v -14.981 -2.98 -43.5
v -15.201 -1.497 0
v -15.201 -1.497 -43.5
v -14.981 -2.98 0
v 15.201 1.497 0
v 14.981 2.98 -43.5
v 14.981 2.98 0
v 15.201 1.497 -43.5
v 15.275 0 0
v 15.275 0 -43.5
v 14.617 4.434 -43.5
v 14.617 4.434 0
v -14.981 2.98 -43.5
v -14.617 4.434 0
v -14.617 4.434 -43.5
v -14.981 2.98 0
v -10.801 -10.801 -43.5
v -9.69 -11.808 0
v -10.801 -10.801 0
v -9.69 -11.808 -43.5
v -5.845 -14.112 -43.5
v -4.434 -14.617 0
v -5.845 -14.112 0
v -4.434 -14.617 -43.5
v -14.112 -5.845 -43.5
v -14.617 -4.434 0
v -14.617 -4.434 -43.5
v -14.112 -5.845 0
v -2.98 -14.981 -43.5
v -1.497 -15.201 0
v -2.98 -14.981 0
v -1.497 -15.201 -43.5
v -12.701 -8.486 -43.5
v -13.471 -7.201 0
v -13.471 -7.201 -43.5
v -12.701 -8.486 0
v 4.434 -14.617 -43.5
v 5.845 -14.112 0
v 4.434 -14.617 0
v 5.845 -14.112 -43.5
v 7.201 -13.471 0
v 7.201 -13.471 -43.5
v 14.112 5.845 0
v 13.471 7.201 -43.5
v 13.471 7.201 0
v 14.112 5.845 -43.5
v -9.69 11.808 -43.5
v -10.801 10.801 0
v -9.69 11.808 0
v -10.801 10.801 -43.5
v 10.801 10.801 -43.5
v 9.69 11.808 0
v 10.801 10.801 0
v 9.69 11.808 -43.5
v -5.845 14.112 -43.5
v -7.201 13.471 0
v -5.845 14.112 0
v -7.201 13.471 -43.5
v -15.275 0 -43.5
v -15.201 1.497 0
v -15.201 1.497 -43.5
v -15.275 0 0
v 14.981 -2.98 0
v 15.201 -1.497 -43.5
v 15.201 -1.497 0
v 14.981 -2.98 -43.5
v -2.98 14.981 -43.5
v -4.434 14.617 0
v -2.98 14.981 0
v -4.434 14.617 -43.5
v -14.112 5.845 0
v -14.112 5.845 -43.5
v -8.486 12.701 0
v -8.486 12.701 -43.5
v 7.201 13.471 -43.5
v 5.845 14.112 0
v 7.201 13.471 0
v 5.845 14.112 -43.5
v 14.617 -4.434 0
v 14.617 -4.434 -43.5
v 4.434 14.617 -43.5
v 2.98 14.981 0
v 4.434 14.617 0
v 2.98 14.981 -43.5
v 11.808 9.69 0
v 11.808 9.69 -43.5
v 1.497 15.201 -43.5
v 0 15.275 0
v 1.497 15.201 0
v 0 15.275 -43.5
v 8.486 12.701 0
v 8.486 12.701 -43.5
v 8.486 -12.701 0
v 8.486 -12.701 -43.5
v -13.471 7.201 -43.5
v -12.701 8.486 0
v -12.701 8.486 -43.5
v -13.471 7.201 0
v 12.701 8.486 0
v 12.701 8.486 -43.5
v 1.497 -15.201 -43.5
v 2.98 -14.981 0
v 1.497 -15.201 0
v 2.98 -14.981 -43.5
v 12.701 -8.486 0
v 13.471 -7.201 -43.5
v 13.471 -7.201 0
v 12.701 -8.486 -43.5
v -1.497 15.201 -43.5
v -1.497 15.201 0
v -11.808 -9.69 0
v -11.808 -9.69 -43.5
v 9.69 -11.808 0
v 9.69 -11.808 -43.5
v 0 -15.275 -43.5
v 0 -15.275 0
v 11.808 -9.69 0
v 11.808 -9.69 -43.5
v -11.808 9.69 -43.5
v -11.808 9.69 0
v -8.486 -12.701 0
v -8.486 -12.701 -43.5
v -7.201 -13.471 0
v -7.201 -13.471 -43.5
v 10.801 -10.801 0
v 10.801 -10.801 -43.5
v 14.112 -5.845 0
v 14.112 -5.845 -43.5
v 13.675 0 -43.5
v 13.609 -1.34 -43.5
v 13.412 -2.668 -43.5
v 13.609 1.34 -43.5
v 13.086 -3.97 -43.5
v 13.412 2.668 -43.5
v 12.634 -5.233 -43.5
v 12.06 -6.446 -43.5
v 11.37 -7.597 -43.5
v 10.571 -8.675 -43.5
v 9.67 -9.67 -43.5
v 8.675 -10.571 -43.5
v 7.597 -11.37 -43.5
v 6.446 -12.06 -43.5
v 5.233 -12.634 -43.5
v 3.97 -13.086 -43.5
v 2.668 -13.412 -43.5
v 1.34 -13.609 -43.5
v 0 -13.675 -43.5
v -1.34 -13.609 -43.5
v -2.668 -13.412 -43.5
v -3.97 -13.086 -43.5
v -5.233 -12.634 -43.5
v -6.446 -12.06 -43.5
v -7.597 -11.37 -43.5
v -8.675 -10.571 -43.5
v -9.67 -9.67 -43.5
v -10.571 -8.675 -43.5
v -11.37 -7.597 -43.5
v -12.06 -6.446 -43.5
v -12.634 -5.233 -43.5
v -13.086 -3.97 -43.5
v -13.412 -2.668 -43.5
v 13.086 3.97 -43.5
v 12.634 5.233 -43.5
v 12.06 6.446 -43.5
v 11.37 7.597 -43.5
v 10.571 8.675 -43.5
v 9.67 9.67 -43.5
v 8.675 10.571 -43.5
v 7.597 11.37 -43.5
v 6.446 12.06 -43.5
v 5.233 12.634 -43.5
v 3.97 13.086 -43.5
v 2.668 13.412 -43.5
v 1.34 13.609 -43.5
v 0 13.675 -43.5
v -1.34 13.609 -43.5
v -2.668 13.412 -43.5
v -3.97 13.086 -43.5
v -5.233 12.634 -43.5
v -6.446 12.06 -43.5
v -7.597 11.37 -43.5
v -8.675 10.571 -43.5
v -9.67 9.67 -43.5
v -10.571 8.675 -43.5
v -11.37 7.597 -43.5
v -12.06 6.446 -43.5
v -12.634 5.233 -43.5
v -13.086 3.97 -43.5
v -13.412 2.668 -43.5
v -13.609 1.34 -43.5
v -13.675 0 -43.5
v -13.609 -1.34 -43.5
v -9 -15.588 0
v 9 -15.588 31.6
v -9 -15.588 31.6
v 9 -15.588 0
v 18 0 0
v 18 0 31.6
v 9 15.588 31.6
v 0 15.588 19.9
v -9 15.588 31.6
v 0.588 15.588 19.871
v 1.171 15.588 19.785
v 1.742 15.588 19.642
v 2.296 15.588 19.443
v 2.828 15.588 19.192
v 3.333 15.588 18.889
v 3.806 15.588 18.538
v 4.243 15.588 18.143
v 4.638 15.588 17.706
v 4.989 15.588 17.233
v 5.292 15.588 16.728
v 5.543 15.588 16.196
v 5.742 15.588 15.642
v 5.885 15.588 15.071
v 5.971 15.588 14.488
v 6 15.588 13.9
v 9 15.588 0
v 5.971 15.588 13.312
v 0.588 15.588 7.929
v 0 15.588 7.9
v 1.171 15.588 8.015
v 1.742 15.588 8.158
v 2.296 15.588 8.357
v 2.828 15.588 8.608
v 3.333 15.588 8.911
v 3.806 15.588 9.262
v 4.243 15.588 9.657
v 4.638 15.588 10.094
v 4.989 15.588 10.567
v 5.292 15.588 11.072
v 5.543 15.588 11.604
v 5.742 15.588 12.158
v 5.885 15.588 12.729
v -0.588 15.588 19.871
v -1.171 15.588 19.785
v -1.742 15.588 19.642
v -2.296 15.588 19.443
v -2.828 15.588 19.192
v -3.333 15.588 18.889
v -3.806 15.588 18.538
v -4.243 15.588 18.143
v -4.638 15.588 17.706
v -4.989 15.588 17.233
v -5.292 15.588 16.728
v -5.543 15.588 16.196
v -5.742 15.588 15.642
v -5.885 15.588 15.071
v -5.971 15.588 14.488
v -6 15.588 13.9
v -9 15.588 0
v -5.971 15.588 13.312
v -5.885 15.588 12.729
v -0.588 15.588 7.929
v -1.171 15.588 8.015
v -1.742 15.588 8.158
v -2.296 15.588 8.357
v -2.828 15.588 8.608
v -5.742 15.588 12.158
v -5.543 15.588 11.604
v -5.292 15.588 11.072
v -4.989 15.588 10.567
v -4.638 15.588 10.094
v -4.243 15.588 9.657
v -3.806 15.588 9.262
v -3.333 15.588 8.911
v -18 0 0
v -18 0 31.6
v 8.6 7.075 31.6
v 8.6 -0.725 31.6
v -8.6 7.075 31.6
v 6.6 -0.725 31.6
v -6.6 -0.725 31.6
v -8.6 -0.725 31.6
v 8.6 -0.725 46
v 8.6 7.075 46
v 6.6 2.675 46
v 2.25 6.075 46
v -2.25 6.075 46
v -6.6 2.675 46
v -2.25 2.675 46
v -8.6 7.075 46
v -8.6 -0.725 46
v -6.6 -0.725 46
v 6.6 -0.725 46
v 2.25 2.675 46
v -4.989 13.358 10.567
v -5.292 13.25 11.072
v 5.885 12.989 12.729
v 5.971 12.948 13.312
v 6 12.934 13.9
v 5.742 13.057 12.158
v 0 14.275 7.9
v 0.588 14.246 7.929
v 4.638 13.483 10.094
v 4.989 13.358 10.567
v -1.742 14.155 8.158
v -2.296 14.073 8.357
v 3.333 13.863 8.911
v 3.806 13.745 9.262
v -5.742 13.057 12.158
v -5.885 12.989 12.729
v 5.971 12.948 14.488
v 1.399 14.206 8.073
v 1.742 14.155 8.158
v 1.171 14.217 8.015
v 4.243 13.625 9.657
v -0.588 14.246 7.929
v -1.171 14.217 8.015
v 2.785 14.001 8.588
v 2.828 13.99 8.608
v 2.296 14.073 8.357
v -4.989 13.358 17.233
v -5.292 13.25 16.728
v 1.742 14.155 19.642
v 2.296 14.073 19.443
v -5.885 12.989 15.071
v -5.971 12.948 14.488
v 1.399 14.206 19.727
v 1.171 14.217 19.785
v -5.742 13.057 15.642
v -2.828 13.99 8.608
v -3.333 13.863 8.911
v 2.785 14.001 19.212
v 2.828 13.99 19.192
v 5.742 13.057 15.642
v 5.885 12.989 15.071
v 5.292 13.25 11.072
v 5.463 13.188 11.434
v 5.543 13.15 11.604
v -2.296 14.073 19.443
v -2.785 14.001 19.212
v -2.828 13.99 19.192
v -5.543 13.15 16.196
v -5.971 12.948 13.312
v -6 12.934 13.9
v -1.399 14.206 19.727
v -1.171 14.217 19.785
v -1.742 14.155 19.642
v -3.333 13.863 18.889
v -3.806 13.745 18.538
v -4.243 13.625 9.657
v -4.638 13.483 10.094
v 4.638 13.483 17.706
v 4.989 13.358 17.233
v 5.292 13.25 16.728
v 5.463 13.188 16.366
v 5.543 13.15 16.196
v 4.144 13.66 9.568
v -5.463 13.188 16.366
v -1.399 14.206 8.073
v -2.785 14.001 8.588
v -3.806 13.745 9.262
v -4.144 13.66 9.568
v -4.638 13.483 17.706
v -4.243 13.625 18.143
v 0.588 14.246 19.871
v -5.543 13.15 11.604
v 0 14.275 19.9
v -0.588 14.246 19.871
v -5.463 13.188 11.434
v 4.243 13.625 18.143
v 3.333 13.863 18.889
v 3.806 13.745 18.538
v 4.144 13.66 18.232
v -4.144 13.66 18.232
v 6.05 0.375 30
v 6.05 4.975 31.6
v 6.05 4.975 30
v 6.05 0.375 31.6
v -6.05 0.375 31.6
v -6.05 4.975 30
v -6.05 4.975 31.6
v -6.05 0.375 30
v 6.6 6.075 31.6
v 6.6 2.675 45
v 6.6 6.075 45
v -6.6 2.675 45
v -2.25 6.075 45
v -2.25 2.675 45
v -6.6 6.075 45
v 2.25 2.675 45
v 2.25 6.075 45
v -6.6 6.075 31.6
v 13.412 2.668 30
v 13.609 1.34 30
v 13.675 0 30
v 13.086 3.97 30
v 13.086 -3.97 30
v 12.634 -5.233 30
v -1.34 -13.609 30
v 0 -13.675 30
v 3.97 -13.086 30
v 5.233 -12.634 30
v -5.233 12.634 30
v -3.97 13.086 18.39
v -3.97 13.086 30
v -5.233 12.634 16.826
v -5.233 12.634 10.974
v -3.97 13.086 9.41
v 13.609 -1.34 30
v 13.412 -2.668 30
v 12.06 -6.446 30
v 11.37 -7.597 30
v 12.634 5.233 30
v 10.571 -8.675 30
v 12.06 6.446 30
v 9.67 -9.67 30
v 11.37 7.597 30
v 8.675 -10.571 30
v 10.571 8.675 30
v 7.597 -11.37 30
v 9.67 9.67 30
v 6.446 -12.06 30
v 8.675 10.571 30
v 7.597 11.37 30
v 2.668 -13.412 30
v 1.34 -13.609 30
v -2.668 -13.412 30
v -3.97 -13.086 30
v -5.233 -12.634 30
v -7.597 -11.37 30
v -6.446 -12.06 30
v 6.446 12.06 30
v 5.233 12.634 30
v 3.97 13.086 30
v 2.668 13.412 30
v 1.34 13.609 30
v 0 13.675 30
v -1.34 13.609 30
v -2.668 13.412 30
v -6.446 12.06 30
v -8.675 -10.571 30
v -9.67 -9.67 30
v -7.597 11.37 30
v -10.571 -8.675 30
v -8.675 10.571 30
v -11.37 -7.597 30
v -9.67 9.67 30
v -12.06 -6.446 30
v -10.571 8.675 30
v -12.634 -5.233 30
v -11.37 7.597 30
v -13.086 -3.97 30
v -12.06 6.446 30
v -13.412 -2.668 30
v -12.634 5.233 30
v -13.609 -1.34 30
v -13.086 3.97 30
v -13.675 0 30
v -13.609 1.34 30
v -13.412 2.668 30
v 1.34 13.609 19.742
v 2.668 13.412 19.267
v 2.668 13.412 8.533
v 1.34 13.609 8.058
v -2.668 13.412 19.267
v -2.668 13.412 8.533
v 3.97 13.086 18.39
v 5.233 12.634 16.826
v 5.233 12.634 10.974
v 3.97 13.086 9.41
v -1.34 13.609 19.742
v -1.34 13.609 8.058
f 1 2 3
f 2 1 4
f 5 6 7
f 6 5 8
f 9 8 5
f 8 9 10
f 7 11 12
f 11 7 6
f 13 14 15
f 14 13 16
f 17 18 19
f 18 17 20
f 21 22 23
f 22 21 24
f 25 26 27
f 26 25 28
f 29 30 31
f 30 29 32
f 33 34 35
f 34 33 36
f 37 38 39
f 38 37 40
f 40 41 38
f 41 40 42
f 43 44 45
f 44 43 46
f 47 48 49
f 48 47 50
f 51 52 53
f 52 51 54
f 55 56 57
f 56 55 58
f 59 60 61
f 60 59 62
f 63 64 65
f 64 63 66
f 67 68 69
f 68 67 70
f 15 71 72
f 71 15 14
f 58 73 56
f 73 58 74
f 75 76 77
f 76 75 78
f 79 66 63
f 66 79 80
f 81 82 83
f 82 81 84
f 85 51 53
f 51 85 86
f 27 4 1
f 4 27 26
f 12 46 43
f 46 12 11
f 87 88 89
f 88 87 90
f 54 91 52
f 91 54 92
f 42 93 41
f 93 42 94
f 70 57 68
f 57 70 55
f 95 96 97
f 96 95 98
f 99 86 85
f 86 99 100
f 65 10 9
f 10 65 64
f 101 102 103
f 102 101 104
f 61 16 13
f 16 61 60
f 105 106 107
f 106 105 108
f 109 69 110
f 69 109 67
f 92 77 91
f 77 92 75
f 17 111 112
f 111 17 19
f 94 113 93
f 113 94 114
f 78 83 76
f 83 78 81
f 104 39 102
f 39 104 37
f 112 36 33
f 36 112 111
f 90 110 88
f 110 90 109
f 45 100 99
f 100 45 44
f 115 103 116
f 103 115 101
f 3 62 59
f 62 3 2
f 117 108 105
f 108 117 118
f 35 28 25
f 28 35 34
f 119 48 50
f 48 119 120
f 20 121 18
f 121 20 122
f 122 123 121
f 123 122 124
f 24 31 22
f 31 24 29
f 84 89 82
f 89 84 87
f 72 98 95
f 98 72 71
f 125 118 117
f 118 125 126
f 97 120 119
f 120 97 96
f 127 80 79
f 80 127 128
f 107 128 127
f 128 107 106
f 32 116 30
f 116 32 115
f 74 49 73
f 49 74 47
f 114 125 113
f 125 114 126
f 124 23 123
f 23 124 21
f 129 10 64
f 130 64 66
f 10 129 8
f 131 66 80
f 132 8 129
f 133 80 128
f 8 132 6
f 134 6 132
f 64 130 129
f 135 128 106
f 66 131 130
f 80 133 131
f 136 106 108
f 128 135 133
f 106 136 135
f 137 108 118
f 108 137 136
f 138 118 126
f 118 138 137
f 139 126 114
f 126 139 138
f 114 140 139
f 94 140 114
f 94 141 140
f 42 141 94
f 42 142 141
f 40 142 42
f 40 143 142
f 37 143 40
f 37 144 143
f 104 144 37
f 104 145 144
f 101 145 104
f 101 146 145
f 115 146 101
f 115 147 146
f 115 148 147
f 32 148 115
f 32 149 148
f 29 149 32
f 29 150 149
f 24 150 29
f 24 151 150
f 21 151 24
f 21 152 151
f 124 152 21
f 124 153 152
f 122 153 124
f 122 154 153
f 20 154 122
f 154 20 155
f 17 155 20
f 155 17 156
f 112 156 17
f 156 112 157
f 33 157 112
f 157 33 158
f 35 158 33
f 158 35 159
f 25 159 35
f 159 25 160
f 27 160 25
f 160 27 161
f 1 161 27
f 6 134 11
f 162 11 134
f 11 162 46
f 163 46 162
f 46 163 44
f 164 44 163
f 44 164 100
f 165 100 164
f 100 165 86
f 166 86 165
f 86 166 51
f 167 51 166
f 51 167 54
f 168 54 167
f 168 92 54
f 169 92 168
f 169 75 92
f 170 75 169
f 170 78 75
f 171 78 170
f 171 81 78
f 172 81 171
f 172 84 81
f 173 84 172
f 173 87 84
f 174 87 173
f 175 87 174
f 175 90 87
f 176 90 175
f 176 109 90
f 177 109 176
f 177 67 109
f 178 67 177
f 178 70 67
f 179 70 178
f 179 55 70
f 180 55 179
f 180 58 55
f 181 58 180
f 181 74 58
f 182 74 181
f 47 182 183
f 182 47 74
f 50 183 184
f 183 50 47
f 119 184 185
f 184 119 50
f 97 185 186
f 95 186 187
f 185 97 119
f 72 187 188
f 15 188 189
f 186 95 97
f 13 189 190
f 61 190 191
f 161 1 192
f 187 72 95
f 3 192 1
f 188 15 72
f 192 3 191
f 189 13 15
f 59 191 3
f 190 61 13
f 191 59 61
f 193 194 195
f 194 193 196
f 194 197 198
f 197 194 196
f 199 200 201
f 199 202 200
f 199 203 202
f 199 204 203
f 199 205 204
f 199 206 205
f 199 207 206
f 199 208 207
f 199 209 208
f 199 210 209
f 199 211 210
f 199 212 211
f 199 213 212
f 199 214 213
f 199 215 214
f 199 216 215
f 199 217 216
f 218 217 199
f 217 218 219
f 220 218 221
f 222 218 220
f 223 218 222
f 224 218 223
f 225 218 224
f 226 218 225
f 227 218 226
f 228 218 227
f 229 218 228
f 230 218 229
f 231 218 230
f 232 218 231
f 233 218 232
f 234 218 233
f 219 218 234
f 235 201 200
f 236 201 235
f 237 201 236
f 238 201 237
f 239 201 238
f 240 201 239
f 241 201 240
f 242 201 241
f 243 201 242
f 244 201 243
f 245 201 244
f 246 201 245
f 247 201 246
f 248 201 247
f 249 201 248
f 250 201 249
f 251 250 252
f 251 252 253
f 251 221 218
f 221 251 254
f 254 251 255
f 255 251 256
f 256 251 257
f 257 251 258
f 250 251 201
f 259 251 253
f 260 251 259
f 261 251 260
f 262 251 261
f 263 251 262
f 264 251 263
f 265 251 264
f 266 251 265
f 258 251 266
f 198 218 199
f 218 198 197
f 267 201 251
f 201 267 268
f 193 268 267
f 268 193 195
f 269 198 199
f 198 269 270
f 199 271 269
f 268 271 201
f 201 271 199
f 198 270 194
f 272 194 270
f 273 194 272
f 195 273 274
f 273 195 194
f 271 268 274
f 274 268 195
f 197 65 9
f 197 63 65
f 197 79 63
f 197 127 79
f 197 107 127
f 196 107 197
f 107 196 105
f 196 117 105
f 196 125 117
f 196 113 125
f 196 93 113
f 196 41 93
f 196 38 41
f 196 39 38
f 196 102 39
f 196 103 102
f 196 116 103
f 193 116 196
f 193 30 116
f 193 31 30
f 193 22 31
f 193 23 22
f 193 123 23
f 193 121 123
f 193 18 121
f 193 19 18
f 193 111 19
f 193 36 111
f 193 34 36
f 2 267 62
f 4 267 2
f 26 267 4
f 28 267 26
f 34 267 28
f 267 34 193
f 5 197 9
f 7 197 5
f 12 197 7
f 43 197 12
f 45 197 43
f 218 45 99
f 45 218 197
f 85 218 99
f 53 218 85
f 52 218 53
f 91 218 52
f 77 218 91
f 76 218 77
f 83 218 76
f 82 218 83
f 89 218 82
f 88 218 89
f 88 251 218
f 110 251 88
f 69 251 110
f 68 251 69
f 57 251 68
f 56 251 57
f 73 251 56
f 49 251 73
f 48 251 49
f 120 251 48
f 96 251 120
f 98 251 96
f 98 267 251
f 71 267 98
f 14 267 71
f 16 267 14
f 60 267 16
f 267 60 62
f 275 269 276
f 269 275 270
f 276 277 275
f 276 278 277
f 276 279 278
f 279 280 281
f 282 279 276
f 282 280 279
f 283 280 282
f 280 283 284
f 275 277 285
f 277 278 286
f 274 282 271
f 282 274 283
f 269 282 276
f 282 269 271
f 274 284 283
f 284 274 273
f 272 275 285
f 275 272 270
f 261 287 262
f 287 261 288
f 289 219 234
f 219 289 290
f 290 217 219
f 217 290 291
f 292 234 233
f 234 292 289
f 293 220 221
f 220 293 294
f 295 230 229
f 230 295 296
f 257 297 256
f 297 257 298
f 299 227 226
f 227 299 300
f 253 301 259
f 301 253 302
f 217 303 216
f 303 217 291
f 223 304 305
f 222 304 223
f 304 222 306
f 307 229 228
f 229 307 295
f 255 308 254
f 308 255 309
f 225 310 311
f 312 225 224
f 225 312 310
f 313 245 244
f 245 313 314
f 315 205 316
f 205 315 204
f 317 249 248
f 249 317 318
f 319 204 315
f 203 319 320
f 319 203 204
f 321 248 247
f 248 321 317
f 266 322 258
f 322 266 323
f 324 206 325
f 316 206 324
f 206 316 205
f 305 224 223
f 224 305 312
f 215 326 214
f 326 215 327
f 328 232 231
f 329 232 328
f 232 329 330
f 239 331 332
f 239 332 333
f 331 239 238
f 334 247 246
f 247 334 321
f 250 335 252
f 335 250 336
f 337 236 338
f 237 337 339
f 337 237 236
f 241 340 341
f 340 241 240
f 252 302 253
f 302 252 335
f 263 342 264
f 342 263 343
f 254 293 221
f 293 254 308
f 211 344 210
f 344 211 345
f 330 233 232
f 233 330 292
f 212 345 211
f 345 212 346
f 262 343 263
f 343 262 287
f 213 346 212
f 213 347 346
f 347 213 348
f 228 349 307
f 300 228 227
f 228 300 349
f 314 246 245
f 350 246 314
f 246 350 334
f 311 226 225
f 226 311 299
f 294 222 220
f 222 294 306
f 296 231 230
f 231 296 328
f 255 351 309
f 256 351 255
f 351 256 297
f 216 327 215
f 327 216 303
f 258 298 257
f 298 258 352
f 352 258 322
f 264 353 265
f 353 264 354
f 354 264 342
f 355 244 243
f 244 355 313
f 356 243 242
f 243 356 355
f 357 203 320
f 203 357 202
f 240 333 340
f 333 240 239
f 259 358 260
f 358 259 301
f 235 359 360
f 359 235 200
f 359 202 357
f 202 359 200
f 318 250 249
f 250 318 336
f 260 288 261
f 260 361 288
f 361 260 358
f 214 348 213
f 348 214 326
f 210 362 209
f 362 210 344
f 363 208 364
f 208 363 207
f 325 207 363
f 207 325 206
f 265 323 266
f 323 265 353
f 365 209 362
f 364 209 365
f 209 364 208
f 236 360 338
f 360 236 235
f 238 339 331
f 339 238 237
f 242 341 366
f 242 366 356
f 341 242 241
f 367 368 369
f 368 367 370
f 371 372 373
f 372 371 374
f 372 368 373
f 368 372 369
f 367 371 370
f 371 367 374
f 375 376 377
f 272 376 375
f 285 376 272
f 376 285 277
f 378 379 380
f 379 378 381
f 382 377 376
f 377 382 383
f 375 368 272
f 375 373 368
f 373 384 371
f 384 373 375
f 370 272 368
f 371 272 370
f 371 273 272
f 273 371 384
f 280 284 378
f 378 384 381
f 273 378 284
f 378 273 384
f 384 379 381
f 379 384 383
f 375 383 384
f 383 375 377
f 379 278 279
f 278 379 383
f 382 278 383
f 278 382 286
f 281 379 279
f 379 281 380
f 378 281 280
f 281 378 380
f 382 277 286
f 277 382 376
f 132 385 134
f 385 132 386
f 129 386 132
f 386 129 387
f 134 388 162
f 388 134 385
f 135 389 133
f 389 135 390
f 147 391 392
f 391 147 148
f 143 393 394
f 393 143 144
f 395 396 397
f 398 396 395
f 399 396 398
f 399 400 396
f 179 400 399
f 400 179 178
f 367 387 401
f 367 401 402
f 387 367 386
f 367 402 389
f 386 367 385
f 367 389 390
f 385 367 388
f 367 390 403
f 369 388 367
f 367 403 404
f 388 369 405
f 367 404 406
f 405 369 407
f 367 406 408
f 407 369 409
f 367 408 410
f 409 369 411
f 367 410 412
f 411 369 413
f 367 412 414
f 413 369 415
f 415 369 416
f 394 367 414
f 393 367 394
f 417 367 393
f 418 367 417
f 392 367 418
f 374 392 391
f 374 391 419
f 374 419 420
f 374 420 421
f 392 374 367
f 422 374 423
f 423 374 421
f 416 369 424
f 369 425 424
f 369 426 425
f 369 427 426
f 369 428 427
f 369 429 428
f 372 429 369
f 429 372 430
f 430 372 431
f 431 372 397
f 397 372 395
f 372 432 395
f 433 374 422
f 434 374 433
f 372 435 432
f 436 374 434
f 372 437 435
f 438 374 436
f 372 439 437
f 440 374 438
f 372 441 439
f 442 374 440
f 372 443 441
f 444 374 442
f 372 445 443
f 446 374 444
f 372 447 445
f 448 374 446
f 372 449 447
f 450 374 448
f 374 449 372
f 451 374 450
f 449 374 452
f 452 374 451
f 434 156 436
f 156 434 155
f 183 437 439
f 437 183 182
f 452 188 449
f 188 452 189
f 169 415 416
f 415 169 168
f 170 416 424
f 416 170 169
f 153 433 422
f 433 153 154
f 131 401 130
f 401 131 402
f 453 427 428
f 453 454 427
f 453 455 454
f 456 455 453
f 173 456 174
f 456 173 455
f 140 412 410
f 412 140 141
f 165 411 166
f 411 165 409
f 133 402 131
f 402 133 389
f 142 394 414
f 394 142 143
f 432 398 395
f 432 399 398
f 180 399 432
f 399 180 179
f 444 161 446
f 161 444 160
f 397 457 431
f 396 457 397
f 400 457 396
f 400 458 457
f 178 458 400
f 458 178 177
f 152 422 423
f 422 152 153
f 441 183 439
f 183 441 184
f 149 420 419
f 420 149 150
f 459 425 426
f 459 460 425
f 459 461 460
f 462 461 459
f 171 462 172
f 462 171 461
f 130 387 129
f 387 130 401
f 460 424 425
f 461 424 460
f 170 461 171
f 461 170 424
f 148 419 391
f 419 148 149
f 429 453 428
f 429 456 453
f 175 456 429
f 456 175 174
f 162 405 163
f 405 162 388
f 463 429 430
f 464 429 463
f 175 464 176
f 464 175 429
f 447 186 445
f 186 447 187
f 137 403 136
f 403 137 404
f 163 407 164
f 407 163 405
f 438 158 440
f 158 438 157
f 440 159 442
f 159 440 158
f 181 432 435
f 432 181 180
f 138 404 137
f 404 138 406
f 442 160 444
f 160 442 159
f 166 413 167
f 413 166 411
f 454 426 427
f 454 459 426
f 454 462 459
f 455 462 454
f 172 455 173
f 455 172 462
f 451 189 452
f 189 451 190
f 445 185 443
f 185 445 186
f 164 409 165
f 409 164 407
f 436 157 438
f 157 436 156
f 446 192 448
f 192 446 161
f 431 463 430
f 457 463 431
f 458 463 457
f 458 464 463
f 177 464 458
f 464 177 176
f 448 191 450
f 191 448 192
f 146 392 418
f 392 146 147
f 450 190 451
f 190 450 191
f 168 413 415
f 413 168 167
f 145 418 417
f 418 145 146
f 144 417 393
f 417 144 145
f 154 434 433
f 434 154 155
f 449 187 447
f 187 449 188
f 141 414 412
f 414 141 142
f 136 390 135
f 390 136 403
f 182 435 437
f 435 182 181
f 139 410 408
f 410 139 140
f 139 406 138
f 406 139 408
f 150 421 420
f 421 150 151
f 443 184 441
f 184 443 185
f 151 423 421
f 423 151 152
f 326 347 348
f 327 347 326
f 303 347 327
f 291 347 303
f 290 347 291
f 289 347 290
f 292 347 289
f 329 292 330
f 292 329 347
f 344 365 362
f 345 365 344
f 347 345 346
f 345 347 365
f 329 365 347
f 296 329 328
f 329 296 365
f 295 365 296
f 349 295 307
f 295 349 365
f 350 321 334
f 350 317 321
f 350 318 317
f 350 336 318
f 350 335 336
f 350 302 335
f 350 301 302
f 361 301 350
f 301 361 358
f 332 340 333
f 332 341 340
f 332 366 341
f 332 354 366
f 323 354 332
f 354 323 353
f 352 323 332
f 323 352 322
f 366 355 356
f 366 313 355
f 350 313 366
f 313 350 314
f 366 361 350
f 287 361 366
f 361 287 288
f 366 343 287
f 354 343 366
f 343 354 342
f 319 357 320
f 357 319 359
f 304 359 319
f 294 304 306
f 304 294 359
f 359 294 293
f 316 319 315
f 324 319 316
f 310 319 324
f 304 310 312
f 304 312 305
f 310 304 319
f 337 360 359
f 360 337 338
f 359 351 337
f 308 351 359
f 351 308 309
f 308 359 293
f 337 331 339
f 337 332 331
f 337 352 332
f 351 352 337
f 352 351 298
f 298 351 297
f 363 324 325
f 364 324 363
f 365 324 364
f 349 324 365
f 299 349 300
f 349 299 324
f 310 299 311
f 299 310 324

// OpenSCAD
$fn=6;

r1 = 5.98;
r2 = 9;
r2_p = r2 * sqrt(3) / 2;

big_r1 = 22.5/2;
big_r2 = 14;
big_r2_p = big_r2 * sqrt(3) / 2;

l1 = 30;
l2 = 45;
l3 = 50;

a1 = 35.264389682754654;
a2 = -60;
a3 = -45;


battery_r = 27.35/2;
battery_power_z_offset = 16.1;
battery_power_r = 12/2;

power_connection_h = 30;
power_connection_r = 18;
power_top_thin = 1.6;
power_top_total = 1.6;

battery_sleeve_h = 73.5;
battery_sleeve_r = battery_r + 1.6;

usb_h = 15;
usb_w = 12.1;
usb_thick = 4.6;
usb_w2 = 13.2;
usb_thick2 = 6.8;
usb_y_offset = battery_r - 11;
usb_wire_w = 4.5;


power_female_r = power_connection_r + 1.4;

box_w = power_connection_r * 2 + 1;
box_thick = 18;
box_h = 90;
box_wall = 2;

power();
//controller();

module power() {
difference() {
    union() {
        translate([0,0,power_connection_h - battery_sleeve_h])
        cylinder(h=battery_sleeve_h, r=battery_sleeve_r, $fn=64);
        
        cylinder(h=power_connection_h + power_top_total, r=power_connection_r);
    translate([0, usb_y_offset+.5, power_connection_h + usb_h/2 + 0.5])
    cube([usb_w2+4, usb_thick2+1, usb_h+1], center=true);
    }
    
    // Power indicator
    translate([0,0,power_connection_h - battery_power_z_offset])
    rotate([-90,0,0])
    cylinder(h=100, r=battery_power_r, $fn=64);
    
    translate([0, usb_y_offset, power_connection_h])
    cube([usb_w, usb_thick, usb_h], center=true);
    translate([0, usb_y_offset, power_connection_h + (power_top_thin + usb_h)/2])
    cube([usb_w2, usb_thick2, usb_h - power_top_thin], center=true);
    translate([0, usb_y_offset, power_connection_h + usb_h])
    cube([usb_wire_w, usb_thick2, 5], center=true);
    translate([0, usb_y_offset - usb_thick2/2, power_connection_h + usb_h])
    cube([usb_w2, usb_thick2, 5], center=true);
    
    translate([0,0,power_connection_h - battery_sleeve_h-1])
    cylinder(h=battery_sleeve_h+1, r=battery_r, $fn=64);
}

difference() {
    translate([0,0,0])
    cylinder(h=power_connection_h, r=battery_r+0.6, $fn=64);
    
    translate([0,0,-1])
    cylinder(h=power_connection_h+1, r=battery_r, $fn=64);
}

}

module controller() {
difference() {
    union() {
        cylinder(h=power_connection_h + power_top_total + 2, r=power_female_r);
        translate([0,0,power_connection_h + power_top_total + 2])
        cylinder(h=30, r1=power_female_r, r2=1);
        
        // Actual box
        translate([0, 0, power_connection_h + power_top_total +box_h/2])
        rotate([90,0,0])
        linear_extrude(box_thick+2*box_wall, center=true)
        polygon([
            [0, -box_h/2 - 20],
            [-box_w/2 - box_wall, -box_h/2 - box_wall],
            [-box_w/2 - box_wall, box_h/2 + box_wall],
            [0, box_h/2 + 20],
            [box_w/2 + box_wall, box_h/2 + box_wall],
            [box_w/2 + box_wall, -box_h/2 - box_wall],
        ]);
        //cube([box_w+2*box_wall, box_thick+2*box_wall, box_h+2*box_wall], center=true);
        
        translate([0,0,power_connection_h + power_top_total + box_h-36])
        cylinder(h = 30, r1=1, r2=big_r2);
        translate([0,0,power_connection_h + power_top_total + box_h-6])
        cylinder(h = 56, r=big_r2);
        
        
        translate([0,0, power_connection_h - 16])
        rotate([90,0,0])
        linear_extrude(5, center=true)
        union() {
        polygon([
            [0, -15],
            [30, 10],
            [30, 48],
            [24, 48],
            [24, 76],
            [30, 76],
            [30, 115],
            [0, 140],
        ]);
        rotate([0,180,0])
        polygon([
            [0, -15],
            [30, 10],
            [30, 48],
            [24, 48],
            [24, 76],
            [30, 76],
            [30, 115],
            [0, 140],
        ]);
        }
    }// end union
    
    cylinder(h=power_connection_h + power_top_total, r=power_connection_r + 0.15);
    
    translate([0, 0, power_connection_h + power_top_total + box_h/2])
    cube([power_connection_r*2, box_thick, box_h], center=true);
    
    // Power indicator
    translate([0,0,power_connection_h - battery_power_z_offset])
    rotate([-90,0,0])
    cylinder(h=100, r=battery_power_r, $fn=64);
    
    translate([0,0,power_connection_h + power_top_total + box_h])
    cylinder(h = 51, r=big_r1, $fn=64);
    
    translate([0, 0, -50])
    cube([100, 100, 100], center=true);
    
    // Deboss
    for (i = [0:1]) {
        rotate([0,0,180*i])
        translate([0, -box_thick/2 - box_wall + 0.6, 70])
        rotate([90,0,0])
        linear_extrude(1)
        scale(0.4)
        import("./ravenstear.svg", center=true);
    }
    
    // Removal for "test"
    //translate([0, 0, 220])
    //cube([100,100,400], center=true);
}
}
    
module tossme() {
difference() {
union() {
for (i = [0:2]) {
    rotate([0,0, 120*i])
    union() {
        rotate([a1, 0, 0])
        translate([0,0,-81.63010851410841])
        translate([0,0,-l1])
        difference() {
            cylinder(h=l1, r=r2);
            
//            cylinder(h=l1 + 1, r=r1, $fn=64);
              
            translate([0, r2_p, 0])
            rotate([a2/2, 0, 0]) 
            translate([0, 0, -50])
            cube([100, 100, 100], center=true);
        }
        
        rotate([a1, 0, 0])
        translate([0,0,-81.63010851410841])
        translate([0, r2_p, -l1])
        rotate([a2/2, 0, 0]) 
        difference() {
            rotate([a2/2, 0, 0])    
            translate([0, -r2_p, -l2])
            difference() {
                cylinder(h=l2, r=r2);
            
 //               cylinder(h=l2, r=r1, $fn=64);
                
                translate([0, r2_p, 0])
                rotate([a3/2, 0, 0]) 
                translate([0, 0, -50])
                cube([100, 100, 100], center=true);
            }
            
            translate([-50, -50, 0])
            cube([100, 100, 100]);
        }
        
        rotate([a1, 0, 0])
        translate([0,0,-81.63010851410841])
        translate([0, r2_p, -l1])
        rotate([a2, 0, 0])
        translate([0, 0, -l2])
        rotate([a3/2, 0, 0]) 
        difference() {
            rotate([a3/2, 0, 0])    
            translate([0, -r2_p, -l3])
            cylinder(h=l3, r=r2);
            
  //          rotate([a3/2, 0, 0])    
  //          translate([0, -r2_p, -l3-1])
  //          cylinder(h=l3+1, r=r1, $fn=64);
            
            translate([-50, -50, 0])
            cube([100, 100, 100]);
        }
        
        translate([0,0,-150])
        rotate([-30,0,0])
        translate([0,7,10])
        cube([r2, 16, 35], center=true);
        
        translate([0,0, -195])
        rotate([90,0,30])
        linear_extrude(3, center=true)
        polygon([
            [big_r2_p, 0],
            [big_r2_p + 7, 0],
            [big_r2_p + 7, 12],
            [big_r2_p + 10, 12],
            [big_r2_p + 10, 25],
            [big_r2_p + 7, 25],
            [big_r2_p + 7, 42],
            [big_r2_p + 10, 42],
            [big_r2_p + 10, 75],
            [0, 90],
            [0, 80],
            [big_r2_p + 3, 70],
            [big_r2_p + 3, 50],
            [big_r2_p, 50],
        ]);
    }
} // End for loop
translate([0,0,-130])
//rotate([0,0,30])
union(){
    translate([0,0,-15])
    cylinder(h = 12, r1=big_r2, r2=r2);
    translate([0,0,-65])
    cylinder(h = 50, r=big_r2);
}
} // End union
translate([0,0,-108])
cylinder(h = 10, r=big_r1);
translate([0,0,-145])
cylinder(h = 12, r1=big_r1, r2=r2*0.5, $fn=64);
translate([0,0,-196])
cylinder(h = 51.01, r=big_r1, $fn=64);

//translate([0,0, -150])
//cube([200, 200, 100], center=true);

//cube([200, 200, 370], center=true);

for (i = [0:2]) {
    rotate([0,0, 120*i])
    union() {
        rotate([a1, 0, 0])
        translate([0,0,-81.63010851410841])
        translate([0,0,-l1])
        difference() {            
            cylinder(h=l1 + 1, r=r1, $fn=64);
              
            translate([0, r2_p, 0])
            rotate([a2/2, 0, 0]) 
            translate([0, 0, -50])
            cube([100, 100, 100], center=true);
        }
        
        rotate([a1, 0, 0])
        translate([0,0,-81.63010851410841])
        translate([0, r2_p, -l1])
        rotate([a2/2, 0, 0]) 
        difference() {      
            rotate([a2/2, 0, 0])    
            translate([0, -r2_p, -l2])
            difference() {
                cylinder(h=l2, r=r1, $fn=64);
                
                translate([0, r2_p, 0])
                rotate([a3/2, 0, 0]) 
                translate([0, 0, -50])
                cube([100, 100, 100], center=true);
            }
            
            translate([-50, -50, 0])
            cube([100, 100, 100]);
        }
        
        rotate([a1, 0, 0])
        translate([0,0,-81.63010851410841])
        translate([0, r2_p, -l1])
        rotate([a2, 0, 0])
        translate([0, 0, -l2])
        rotate([a3/2, 0, 0]) 
        difference() {
            rotate([a3/2, 0, 0])    
            translate([0, -r2_p, -l3-1])
            cylinder(h=l3+1, r=r1, $fn=64);
            
            translate([-50, -50, 0])
            cube([100, 100, 100]);
        }
        
        translate([0,7,-165])
        cube([4, 16, 36], center=true);
    }
} // End for loop

} // End difference
}
